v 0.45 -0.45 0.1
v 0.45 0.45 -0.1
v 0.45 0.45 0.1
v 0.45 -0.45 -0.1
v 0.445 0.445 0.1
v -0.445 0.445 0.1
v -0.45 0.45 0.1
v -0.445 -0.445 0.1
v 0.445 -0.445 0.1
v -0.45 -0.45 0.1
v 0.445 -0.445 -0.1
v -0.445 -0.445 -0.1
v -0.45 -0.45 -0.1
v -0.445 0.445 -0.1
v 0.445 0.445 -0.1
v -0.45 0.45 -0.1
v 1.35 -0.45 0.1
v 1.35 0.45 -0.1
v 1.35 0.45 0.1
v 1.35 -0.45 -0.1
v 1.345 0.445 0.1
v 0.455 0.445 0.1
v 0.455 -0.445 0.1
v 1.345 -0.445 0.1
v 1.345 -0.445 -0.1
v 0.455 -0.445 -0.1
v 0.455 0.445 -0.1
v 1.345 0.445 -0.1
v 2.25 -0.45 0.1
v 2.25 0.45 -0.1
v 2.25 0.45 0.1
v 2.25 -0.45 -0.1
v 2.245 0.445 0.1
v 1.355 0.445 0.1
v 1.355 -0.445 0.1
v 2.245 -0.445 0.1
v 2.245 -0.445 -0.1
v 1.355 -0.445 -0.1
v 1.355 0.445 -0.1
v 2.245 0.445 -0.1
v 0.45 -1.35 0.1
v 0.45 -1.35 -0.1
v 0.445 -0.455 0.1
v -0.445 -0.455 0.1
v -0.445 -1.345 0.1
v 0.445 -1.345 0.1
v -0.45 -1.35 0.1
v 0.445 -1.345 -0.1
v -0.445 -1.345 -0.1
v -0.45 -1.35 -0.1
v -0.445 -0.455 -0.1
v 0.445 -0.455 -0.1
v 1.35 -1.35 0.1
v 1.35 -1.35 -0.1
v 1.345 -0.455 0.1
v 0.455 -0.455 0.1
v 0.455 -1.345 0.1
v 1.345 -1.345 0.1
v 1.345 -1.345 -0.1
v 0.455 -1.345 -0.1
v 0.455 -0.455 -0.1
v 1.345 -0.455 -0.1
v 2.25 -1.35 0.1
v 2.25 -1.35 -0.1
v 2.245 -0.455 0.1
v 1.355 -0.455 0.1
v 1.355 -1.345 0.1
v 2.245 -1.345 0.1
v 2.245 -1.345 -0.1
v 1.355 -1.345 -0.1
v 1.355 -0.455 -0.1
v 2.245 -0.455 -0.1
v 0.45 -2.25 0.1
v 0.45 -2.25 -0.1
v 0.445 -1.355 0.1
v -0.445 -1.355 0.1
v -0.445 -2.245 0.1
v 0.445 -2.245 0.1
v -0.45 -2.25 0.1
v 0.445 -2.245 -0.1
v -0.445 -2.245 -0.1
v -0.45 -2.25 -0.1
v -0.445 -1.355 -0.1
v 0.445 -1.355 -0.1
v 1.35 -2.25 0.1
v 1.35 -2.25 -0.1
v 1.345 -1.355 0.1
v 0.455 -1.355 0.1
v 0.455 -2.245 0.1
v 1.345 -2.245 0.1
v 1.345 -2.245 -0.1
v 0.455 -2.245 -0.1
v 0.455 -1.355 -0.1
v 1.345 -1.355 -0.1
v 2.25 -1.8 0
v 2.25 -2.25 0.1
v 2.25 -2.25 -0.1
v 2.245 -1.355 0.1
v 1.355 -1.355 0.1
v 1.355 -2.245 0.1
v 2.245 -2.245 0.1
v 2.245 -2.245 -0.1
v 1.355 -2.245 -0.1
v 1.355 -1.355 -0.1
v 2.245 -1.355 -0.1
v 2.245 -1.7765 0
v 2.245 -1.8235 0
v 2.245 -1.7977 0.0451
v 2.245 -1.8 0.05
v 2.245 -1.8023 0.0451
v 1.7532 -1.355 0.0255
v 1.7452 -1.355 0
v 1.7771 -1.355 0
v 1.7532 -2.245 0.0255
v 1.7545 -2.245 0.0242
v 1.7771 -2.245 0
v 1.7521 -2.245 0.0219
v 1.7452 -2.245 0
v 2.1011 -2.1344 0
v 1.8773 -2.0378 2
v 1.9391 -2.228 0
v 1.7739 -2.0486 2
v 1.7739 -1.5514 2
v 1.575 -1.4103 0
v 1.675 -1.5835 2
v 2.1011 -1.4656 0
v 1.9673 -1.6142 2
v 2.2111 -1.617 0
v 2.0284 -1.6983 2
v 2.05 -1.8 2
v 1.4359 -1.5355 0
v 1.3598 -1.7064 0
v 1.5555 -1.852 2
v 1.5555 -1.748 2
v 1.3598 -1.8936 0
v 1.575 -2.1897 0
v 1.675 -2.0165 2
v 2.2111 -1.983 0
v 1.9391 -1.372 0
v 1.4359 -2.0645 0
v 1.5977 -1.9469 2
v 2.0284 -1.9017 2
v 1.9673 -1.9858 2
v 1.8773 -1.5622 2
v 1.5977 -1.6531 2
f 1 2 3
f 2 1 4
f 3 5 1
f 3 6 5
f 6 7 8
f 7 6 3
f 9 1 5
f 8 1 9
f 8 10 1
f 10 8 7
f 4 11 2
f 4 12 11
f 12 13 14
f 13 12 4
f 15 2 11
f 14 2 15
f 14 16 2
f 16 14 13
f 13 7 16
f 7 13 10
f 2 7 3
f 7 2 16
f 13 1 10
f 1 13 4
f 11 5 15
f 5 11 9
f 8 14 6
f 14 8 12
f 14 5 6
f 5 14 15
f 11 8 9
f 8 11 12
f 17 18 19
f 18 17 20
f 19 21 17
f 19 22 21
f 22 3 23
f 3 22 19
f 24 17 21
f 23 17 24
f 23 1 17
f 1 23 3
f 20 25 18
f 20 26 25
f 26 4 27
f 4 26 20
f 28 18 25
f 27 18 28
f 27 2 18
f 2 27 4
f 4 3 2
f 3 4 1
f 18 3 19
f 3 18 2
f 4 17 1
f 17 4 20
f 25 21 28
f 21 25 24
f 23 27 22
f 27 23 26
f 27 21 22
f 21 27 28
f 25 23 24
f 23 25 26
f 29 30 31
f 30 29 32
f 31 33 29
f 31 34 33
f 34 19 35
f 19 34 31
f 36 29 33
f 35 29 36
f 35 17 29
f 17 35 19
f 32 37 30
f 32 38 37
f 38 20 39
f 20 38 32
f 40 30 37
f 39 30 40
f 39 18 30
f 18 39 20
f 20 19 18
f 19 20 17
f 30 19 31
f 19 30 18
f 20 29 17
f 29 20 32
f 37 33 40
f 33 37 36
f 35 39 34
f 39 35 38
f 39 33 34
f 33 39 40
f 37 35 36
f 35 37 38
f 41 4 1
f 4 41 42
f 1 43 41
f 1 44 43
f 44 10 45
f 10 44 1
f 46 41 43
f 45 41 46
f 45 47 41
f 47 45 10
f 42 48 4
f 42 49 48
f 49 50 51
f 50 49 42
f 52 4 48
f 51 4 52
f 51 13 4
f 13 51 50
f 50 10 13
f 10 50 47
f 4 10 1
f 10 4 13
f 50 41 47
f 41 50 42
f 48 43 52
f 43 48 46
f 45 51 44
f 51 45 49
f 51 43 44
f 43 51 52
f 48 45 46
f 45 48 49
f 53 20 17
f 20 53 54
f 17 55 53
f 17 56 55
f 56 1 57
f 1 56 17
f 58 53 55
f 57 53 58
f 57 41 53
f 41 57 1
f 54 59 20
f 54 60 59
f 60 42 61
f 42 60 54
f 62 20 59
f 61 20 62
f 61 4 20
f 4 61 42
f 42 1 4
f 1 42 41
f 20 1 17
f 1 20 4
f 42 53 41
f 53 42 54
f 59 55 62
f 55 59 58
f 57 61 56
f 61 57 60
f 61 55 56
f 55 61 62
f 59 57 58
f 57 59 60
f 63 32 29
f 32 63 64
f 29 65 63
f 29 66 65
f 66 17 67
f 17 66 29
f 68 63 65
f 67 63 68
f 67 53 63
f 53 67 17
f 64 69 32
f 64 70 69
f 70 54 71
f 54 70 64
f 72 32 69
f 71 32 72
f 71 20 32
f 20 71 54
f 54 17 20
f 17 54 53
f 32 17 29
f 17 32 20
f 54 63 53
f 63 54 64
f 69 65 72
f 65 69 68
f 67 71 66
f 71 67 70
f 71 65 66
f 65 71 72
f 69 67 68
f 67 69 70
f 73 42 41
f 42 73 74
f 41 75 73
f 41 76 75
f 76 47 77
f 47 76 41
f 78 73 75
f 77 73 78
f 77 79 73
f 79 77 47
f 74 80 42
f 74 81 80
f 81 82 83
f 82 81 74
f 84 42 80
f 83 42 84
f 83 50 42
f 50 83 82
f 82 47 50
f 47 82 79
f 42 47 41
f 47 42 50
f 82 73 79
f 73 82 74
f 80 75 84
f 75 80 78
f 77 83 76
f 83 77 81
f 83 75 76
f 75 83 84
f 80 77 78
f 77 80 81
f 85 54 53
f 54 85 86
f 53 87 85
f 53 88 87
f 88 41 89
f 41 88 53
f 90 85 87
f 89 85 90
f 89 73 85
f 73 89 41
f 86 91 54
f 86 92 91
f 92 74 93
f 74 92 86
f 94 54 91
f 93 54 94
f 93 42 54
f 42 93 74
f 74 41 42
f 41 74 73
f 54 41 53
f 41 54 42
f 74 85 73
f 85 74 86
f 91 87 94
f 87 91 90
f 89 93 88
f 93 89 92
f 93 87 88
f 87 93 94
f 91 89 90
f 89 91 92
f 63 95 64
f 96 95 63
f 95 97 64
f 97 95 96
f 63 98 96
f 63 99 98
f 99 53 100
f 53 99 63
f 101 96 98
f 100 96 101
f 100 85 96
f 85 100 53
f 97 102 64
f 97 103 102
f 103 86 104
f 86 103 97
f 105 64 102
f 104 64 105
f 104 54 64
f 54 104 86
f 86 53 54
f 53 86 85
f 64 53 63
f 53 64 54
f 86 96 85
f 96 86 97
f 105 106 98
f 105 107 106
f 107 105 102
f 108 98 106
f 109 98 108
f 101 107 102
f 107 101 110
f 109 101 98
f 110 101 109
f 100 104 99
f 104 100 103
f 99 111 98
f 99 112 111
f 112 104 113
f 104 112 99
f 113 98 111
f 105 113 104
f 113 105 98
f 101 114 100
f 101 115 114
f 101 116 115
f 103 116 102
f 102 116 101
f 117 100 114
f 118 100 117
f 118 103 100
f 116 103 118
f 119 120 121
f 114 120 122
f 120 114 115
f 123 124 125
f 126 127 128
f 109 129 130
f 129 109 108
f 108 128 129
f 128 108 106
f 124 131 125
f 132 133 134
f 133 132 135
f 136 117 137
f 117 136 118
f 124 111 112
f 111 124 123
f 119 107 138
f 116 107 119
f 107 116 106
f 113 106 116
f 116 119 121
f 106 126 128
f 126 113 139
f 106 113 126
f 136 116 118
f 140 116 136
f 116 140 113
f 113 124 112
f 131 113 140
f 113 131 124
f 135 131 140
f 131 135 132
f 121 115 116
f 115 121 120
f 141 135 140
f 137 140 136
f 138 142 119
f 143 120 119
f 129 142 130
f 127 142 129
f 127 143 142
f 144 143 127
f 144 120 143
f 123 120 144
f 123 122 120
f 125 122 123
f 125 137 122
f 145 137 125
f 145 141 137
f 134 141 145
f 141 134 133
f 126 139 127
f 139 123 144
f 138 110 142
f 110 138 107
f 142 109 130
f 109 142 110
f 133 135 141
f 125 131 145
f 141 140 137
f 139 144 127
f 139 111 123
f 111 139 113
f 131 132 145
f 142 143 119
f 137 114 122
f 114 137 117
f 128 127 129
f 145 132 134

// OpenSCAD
$fn=15;
gridLength = 2.7;
gridSquares = 3;
oneGridLength = gridLength / gridSquares;
module oneGrid(){
  difference(){
    cube([oneGridLength,oneGridLength,0.2], center = true);
    cube([oneGridLength - 0.01,oneGridLength - 0.01,0.3], center = true);

  }
}

module buildGrid(array){
  for ( row=[0:1:gridSquares - 1]) {
    for ( col=[0:1:gridSquares - 1]) {
      translate([col * oneGridLength,row * -1 * oneGridLength,0])
      oneGrid();
    }
  }
  
  for ( row=[0:1:gridSquares - 1]) {
    for ( col=[0:1:gridSquares - 1]) {
      if(array[row][col] == 1){
        translate([col * oneGridLength,row * -1 * oneGridLength,0])
        cylinder(h=2,d1=oneGridLength, d2 = 0.5);
      }   
    }
  }
  
    
}

receiver_array = [[0,0,0],
                 [0,0,0],
                 [0,0,1]];

buildGrid(receiver_array);
